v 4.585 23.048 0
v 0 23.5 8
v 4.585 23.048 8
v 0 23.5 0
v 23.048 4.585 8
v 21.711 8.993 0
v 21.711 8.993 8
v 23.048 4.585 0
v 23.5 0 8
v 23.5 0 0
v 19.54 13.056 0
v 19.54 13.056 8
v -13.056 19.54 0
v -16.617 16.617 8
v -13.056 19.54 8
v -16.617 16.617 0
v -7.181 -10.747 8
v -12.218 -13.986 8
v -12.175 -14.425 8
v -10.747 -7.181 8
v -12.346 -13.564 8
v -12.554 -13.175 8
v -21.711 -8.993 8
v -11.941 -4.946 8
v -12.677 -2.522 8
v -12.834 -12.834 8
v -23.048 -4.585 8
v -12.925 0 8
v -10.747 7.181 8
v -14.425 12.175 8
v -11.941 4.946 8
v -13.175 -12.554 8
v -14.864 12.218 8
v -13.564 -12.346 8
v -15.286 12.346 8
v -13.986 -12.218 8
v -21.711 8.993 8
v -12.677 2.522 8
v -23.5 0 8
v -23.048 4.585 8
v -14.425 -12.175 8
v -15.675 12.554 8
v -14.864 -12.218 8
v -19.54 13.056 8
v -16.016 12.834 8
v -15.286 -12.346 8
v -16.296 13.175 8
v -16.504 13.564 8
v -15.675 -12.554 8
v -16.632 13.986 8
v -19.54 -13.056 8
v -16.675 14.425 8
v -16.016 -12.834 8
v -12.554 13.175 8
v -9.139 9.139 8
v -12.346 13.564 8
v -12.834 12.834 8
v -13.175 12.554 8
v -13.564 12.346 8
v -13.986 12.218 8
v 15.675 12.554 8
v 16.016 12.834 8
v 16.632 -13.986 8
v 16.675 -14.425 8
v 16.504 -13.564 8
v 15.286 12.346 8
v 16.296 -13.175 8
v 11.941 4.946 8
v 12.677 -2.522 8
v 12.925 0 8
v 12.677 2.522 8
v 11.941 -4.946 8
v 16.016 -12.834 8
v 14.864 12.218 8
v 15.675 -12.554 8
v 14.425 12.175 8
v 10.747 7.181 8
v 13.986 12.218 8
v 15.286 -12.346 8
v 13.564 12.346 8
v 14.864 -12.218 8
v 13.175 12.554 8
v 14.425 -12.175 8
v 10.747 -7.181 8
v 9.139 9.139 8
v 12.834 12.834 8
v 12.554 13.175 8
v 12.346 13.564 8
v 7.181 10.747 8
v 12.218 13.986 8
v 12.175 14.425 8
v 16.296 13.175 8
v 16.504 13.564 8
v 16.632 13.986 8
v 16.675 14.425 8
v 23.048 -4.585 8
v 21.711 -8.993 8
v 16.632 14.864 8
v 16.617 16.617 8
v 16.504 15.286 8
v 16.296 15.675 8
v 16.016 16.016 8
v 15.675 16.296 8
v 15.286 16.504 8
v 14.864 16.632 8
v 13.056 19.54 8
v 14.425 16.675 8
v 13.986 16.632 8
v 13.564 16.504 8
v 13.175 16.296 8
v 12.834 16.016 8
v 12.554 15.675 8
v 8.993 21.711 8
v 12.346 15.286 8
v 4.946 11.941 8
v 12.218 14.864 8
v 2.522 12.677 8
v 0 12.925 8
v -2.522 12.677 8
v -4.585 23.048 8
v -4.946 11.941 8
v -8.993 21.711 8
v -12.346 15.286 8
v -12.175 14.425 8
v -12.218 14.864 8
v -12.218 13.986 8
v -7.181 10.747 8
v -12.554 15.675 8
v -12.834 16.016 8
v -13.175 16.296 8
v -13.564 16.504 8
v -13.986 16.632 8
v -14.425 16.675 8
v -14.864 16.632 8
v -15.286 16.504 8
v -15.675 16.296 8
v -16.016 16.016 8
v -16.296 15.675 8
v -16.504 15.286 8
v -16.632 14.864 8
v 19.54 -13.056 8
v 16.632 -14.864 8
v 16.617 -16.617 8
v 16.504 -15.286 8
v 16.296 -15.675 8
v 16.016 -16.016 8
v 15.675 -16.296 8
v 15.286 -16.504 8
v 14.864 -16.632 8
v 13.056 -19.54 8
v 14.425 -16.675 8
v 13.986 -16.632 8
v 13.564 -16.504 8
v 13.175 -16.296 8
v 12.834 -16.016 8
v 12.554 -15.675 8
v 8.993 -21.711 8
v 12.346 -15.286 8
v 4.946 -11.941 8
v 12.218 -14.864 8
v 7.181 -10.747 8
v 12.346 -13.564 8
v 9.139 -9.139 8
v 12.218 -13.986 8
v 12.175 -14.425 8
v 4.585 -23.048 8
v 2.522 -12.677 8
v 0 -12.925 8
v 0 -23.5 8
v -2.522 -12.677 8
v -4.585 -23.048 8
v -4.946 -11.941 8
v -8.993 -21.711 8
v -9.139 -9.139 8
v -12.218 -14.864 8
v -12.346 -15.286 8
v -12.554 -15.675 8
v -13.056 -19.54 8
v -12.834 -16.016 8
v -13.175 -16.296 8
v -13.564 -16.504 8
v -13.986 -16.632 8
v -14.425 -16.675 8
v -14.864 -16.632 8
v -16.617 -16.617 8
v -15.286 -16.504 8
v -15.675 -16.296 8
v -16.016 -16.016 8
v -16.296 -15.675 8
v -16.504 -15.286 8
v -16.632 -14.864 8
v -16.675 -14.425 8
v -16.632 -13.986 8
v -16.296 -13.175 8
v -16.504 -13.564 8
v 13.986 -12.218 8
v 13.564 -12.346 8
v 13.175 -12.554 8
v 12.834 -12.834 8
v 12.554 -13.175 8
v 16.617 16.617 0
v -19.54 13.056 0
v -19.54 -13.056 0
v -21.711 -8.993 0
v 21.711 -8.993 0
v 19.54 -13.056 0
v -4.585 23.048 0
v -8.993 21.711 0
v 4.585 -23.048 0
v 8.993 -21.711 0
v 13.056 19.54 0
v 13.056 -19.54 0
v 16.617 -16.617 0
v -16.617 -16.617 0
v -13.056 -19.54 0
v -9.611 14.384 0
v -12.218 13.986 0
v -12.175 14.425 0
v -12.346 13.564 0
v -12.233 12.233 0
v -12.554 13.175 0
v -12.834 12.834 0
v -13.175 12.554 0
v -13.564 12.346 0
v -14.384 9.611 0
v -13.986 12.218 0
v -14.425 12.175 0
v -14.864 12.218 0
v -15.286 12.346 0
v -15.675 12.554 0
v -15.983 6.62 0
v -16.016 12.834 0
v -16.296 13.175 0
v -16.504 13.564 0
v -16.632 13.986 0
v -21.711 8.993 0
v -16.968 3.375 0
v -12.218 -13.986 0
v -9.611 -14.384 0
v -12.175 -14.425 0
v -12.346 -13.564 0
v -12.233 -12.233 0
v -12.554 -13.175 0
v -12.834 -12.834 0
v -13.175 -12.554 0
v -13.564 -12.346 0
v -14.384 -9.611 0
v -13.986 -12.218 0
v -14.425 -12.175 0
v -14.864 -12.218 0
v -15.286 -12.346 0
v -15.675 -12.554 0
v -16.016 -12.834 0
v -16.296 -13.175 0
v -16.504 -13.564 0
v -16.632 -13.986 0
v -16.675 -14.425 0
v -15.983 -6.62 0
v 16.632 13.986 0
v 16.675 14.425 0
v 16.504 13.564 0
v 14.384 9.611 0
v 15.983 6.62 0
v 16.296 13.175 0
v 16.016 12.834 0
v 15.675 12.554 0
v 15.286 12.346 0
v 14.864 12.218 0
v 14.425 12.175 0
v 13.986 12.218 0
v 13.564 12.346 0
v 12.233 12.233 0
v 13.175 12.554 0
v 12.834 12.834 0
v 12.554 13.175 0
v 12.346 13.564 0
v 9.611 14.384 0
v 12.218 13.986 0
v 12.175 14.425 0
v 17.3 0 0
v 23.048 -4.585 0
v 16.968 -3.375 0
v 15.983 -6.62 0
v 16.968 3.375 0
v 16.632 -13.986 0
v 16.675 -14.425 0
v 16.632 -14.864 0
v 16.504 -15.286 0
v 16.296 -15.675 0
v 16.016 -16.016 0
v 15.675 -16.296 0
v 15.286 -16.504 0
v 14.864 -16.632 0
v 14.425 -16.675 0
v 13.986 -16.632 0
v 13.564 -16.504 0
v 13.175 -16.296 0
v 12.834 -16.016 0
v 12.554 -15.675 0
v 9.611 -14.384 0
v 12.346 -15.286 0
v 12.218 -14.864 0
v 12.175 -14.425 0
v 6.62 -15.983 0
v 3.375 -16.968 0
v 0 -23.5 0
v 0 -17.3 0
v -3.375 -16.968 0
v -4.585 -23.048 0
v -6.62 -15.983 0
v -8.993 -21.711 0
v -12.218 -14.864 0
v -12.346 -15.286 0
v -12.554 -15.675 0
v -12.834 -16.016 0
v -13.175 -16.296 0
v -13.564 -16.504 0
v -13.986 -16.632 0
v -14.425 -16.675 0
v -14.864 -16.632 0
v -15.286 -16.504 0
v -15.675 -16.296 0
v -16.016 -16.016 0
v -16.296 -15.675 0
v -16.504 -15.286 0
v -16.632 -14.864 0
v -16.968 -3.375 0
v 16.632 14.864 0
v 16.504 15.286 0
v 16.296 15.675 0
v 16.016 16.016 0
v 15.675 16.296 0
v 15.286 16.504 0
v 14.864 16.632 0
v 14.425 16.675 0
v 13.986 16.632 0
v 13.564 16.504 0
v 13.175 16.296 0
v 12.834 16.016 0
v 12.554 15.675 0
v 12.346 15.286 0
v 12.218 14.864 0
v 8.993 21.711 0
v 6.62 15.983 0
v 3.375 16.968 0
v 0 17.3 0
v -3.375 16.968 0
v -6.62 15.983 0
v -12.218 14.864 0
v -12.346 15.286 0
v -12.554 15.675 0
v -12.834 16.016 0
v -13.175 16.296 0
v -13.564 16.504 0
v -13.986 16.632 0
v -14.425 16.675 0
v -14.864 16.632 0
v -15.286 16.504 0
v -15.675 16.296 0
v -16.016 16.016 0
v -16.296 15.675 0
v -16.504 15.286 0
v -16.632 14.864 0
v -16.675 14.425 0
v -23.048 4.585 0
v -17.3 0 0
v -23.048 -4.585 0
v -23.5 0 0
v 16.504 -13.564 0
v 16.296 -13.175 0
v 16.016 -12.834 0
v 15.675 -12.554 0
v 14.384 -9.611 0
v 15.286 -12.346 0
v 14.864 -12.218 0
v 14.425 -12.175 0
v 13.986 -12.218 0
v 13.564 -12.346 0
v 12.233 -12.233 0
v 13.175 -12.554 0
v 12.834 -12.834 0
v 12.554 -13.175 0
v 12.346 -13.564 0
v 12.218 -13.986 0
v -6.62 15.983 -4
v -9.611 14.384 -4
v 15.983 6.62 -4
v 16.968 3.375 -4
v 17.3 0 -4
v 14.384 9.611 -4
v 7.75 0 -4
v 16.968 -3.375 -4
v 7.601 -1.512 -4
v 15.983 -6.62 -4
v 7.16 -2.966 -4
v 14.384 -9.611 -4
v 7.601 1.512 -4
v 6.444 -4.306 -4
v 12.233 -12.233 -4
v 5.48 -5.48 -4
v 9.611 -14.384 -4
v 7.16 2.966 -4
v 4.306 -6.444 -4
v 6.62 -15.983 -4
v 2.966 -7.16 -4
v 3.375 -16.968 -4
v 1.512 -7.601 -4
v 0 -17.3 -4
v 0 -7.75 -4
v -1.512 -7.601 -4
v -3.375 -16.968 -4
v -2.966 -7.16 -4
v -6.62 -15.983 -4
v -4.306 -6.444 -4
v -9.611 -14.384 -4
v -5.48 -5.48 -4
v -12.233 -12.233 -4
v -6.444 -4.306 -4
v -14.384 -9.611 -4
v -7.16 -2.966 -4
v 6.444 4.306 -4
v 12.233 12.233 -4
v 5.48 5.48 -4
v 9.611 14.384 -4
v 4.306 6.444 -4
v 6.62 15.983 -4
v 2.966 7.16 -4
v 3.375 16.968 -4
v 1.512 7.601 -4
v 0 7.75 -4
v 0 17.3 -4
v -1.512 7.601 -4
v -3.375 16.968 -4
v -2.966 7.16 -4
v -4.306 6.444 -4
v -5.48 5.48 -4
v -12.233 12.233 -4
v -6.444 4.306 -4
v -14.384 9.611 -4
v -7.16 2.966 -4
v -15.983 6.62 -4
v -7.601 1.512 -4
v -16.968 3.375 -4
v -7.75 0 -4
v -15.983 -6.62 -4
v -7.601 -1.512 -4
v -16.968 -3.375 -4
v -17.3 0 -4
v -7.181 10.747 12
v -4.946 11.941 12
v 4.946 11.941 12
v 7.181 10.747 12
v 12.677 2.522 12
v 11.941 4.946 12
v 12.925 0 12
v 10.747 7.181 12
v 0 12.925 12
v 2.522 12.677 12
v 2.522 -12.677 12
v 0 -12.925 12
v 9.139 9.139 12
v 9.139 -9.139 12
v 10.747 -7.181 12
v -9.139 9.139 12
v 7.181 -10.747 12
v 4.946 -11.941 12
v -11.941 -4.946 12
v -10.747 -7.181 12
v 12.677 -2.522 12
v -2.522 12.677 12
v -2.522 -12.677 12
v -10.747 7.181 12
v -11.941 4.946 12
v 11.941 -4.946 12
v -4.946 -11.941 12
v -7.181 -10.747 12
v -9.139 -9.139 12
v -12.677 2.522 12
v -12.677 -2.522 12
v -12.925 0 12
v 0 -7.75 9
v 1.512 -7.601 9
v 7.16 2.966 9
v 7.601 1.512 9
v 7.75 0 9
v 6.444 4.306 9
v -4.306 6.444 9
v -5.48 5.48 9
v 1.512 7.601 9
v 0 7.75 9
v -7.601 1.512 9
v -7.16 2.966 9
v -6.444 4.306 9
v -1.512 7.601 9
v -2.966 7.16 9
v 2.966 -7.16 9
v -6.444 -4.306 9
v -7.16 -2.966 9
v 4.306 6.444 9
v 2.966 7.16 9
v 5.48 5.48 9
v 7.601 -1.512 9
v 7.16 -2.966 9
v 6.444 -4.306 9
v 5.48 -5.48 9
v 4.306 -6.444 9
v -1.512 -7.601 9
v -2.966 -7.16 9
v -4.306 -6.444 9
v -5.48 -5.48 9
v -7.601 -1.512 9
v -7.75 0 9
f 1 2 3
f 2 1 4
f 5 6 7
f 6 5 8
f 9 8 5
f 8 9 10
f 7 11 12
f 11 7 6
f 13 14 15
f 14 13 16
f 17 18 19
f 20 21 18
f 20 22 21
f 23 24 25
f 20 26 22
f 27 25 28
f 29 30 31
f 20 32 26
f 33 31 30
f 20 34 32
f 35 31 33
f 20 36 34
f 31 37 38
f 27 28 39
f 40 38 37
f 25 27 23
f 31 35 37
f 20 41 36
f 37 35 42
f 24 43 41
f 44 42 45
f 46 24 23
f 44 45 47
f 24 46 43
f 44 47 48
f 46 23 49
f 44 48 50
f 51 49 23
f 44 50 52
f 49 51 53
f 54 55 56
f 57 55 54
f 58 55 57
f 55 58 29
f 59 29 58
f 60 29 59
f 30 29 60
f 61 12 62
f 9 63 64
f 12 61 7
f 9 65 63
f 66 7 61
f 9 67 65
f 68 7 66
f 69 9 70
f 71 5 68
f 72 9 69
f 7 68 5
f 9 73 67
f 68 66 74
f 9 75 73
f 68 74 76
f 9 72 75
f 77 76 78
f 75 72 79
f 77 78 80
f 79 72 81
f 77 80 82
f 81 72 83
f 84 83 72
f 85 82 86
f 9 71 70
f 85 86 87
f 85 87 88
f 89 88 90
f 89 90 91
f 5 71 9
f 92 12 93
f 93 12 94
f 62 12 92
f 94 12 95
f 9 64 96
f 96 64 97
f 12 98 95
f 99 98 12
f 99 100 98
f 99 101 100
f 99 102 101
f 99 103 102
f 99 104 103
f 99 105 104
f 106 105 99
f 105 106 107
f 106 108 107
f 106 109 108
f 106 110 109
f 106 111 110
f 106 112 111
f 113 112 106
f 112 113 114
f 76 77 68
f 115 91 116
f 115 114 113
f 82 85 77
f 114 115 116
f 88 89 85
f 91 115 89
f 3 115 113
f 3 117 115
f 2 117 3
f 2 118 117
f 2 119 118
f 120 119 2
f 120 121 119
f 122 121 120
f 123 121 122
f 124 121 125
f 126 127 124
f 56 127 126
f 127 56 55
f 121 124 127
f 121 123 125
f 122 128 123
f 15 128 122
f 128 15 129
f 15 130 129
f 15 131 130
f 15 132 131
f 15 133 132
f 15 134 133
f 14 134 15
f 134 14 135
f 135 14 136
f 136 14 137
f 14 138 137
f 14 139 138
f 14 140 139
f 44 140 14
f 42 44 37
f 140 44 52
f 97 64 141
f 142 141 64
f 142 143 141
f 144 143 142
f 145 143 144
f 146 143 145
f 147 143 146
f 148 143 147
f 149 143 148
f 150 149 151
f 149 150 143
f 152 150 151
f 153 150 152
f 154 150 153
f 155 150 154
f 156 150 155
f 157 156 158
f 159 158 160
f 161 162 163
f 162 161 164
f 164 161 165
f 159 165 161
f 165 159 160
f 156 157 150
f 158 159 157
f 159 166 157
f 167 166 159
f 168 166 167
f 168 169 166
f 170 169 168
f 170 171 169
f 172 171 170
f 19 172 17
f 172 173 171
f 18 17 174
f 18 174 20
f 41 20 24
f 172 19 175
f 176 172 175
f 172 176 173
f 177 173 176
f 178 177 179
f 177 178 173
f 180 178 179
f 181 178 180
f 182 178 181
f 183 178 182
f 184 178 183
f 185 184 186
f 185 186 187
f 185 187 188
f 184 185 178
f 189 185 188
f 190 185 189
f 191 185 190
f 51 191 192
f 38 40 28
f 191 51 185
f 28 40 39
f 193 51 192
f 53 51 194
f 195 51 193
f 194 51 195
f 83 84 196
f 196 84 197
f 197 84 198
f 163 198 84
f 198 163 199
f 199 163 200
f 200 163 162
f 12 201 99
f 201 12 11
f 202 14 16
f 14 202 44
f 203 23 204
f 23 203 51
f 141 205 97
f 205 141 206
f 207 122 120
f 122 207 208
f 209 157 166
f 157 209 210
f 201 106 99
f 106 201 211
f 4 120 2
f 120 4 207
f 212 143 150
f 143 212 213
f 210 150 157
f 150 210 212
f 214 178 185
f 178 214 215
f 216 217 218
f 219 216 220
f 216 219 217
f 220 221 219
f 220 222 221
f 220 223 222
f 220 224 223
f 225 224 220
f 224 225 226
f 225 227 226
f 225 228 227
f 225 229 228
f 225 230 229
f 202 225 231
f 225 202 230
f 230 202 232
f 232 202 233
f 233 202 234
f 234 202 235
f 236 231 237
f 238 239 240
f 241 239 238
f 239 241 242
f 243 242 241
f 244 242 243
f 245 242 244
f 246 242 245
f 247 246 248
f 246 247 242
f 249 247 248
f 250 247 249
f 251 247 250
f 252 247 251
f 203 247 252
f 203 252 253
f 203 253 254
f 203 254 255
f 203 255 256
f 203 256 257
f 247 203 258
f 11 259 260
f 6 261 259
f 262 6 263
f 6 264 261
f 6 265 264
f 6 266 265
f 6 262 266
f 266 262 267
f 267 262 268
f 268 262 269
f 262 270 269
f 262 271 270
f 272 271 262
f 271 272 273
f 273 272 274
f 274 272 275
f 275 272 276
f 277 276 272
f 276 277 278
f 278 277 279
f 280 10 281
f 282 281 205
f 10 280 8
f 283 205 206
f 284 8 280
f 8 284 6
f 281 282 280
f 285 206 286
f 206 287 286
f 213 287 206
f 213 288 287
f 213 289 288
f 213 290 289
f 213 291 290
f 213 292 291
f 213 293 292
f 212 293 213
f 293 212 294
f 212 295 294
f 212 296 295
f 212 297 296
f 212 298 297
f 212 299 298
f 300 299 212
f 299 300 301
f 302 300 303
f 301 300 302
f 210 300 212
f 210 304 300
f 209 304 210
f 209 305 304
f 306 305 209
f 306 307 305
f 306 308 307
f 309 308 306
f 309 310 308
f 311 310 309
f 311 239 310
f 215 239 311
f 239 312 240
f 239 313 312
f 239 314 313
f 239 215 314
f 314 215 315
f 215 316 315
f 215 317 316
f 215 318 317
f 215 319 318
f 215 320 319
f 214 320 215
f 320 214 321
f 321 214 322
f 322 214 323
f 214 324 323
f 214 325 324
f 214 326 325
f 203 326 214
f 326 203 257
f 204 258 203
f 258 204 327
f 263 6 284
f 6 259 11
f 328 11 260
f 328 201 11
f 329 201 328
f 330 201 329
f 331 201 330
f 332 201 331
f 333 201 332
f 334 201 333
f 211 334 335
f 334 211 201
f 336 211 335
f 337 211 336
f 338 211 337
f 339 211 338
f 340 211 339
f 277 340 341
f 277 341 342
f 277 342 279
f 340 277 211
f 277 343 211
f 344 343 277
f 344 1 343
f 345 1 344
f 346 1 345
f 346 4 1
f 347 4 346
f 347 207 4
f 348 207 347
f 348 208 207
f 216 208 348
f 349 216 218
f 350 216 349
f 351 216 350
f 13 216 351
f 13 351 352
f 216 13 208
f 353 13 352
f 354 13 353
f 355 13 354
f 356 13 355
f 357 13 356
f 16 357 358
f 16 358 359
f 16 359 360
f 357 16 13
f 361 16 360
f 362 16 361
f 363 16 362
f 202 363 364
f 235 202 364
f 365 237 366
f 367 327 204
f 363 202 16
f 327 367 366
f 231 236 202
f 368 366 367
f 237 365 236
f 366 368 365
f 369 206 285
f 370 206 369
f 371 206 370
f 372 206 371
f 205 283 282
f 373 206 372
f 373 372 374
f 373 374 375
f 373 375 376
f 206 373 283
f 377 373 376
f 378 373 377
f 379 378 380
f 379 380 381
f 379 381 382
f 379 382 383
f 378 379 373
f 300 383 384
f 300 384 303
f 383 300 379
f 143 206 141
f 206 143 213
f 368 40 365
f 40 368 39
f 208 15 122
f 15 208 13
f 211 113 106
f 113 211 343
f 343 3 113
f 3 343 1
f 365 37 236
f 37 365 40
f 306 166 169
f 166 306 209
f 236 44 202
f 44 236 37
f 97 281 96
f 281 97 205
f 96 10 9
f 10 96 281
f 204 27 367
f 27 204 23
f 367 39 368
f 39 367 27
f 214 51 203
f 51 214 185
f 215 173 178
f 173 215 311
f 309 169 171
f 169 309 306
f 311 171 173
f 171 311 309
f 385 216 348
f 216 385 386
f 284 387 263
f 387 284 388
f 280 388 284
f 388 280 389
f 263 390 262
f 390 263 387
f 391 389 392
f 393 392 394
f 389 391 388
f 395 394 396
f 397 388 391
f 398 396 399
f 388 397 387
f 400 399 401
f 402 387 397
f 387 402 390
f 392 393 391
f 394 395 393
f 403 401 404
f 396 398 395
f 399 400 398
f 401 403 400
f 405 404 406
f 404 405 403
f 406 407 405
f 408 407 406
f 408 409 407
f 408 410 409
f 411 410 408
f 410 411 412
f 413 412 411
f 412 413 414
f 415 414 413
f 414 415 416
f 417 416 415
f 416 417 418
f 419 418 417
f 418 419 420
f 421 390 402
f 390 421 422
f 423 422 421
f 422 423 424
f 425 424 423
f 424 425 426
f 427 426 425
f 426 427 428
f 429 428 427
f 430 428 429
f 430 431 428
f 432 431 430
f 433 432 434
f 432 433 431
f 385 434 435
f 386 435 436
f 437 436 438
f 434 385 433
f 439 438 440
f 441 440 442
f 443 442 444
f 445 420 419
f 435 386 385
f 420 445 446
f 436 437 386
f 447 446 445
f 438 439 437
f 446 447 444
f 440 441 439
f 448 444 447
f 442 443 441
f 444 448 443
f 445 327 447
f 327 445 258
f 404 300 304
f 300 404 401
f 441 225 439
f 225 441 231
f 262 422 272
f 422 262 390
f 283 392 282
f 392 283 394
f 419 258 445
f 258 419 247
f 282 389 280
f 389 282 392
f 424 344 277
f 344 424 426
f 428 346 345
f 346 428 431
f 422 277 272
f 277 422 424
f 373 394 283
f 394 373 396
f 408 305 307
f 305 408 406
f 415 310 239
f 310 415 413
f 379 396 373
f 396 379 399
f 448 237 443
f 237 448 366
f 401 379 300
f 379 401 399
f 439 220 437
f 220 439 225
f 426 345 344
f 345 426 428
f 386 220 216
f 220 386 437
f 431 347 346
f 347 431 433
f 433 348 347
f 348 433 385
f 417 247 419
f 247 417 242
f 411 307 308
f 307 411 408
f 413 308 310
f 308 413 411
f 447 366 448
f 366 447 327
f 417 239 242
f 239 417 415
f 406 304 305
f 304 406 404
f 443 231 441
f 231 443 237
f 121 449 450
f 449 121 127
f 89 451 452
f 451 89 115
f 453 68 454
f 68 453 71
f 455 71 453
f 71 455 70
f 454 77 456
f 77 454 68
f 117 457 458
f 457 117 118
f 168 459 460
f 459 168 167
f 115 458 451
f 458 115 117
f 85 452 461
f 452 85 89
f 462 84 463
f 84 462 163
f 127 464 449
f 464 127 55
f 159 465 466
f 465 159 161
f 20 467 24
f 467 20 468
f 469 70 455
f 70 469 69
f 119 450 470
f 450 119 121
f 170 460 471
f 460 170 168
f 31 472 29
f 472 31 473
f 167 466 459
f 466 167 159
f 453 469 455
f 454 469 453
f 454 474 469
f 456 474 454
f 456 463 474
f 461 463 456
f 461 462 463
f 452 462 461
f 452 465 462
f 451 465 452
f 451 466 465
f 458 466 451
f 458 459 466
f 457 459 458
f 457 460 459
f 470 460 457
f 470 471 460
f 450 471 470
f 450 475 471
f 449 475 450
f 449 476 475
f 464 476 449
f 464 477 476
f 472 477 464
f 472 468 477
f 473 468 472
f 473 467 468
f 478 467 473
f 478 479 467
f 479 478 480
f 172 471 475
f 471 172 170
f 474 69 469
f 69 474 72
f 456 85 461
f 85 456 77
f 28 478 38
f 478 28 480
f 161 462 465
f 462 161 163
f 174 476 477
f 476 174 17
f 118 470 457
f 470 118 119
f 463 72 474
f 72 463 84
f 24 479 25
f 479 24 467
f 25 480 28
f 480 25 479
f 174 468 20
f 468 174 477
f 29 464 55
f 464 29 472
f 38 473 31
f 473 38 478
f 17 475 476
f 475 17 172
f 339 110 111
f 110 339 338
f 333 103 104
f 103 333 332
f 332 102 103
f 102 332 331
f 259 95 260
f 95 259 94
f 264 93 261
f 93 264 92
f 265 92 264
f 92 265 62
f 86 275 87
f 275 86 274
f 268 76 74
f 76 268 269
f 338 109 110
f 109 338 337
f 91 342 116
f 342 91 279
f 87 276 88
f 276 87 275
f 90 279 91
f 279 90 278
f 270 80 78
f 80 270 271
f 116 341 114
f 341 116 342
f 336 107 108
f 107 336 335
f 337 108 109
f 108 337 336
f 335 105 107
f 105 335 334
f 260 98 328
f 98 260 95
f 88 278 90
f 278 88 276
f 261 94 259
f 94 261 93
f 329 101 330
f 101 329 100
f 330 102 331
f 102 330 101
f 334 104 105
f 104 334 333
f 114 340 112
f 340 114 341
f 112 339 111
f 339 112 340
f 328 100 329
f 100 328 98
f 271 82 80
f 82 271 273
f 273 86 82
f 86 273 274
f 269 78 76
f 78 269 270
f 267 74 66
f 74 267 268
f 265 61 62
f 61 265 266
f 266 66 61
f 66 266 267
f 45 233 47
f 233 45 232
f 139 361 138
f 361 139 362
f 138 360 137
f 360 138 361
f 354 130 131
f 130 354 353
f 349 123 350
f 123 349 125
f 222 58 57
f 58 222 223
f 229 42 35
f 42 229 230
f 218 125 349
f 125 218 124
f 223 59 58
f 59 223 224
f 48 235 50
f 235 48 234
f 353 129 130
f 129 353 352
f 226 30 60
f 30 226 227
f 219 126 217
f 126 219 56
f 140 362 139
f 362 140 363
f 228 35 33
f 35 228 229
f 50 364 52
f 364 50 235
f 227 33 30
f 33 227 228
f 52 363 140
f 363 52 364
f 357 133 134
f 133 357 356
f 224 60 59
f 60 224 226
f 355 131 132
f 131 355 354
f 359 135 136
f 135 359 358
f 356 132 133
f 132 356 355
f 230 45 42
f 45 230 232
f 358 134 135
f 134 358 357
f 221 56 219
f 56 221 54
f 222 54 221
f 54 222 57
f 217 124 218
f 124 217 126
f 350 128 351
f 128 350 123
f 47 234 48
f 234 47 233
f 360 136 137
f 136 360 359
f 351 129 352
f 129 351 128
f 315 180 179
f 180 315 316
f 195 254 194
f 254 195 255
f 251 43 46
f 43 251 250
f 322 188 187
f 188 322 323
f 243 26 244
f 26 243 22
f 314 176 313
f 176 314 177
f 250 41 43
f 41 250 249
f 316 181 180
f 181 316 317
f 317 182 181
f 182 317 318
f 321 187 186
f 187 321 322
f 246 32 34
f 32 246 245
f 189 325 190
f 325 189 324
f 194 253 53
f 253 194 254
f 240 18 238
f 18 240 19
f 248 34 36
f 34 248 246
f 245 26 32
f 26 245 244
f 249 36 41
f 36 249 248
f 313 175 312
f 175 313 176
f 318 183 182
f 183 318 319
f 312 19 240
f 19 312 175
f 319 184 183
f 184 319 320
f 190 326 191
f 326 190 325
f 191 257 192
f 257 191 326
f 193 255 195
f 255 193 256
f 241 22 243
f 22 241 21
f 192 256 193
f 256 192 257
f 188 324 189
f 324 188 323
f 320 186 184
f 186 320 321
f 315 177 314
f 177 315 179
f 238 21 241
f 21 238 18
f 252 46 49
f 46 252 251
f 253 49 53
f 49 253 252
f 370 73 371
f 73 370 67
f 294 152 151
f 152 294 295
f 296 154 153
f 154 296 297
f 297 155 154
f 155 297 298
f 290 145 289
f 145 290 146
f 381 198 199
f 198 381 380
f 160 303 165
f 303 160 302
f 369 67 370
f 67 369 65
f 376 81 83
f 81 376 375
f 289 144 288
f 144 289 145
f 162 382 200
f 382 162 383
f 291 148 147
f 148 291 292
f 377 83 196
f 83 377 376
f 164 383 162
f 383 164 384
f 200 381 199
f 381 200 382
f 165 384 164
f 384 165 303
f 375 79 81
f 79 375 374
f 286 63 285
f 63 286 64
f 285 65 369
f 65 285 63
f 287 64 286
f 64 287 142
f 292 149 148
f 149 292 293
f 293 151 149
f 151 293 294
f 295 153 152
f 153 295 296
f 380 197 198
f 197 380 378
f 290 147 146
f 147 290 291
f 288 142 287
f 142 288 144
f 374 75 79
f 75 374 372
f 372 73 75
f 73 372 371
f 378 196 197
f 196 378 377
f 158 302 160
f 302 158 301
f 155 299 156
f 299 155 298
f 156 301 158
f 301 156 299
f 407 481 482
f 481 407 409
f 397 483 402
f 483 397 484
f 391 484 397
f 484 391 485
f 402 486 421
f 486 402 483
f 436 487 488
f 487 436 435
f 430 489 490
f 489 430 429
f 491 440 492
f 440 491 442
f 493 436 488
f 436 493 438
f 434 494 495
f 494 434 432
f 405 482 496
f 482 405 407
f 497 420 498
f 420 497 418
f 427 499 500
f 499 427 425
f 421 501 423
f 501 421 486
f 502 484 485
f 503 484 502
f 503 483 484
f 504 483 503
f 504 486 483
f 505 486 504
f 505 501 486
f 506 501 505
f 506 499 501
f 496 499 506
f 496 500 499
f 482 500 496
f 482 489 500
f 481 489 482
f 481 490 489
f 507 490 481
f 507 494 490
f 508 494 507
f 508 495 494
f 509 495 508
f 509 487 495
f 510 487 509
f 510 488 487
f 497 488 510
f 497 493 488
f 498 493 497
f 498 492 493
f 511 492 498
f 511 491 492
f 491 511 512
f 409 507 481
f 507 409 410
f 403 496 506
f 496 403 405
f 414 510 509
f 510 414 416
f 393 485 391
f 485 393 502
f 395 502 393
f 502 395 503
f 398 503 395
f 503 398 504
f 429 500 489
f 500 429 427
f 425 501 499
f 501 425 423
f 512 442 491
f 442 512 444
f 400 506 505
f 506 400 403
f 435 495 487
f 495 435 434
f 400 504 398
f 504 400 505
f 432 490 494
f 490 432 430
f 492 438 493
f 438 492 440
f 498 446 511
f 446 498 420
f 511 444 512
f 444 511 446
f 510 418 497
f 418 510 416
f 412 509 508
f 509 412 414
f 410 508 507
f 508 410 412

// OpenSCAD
$fn = 32;

// ----------------------------------------------------------------------
// Retaining cap: 6202 cover, 47 mm, spigot 34.6 mm
// ----------------------------------------------------------------------

// --- parameters (mm) ---
plate_d = 47;             // cover diameter
plate_t = 8;              // cover thickness
boss_d = 34.6;            // spigot that enters the housing
boss_h = 4;               // spigot height
shaft_d = 15.5;           // shaft opening
bolt_d = 4.5;             // bolt clearance
bolt_r = 20.4;            // bolt circle radius
dome_h = 4;               // raised centre

module cover() {
  cylinder(h = plate_t, d = plate_d);
}

module spigot() {
  /* sunk 1 mm into the cover; the spigot sets the overall height */
  translate([0, 0, -boss_h]) cylinder(h = boss_h + 1, d = boss_d);
}

module dome() {
  translate([0, 0, plate_t - 1]) cylinder(h = dome_h + 1, d = plate_d * 0.55);
}

difference() {
  union() {
    cover();
    spigot();
    dome();
  }
  for (i = [0 : 3]) rotate([0, 0, 45 + i * 90]) translate([bolt_r, 0, -boss_h - 1])
    cylinder(h = boss_h + plate_t + 2, d = bolt_d);
  translate([0, 0, -boss_h - 1]) cylinder(h = boss_h + plate_t + 2, d = shaft_d);
}
